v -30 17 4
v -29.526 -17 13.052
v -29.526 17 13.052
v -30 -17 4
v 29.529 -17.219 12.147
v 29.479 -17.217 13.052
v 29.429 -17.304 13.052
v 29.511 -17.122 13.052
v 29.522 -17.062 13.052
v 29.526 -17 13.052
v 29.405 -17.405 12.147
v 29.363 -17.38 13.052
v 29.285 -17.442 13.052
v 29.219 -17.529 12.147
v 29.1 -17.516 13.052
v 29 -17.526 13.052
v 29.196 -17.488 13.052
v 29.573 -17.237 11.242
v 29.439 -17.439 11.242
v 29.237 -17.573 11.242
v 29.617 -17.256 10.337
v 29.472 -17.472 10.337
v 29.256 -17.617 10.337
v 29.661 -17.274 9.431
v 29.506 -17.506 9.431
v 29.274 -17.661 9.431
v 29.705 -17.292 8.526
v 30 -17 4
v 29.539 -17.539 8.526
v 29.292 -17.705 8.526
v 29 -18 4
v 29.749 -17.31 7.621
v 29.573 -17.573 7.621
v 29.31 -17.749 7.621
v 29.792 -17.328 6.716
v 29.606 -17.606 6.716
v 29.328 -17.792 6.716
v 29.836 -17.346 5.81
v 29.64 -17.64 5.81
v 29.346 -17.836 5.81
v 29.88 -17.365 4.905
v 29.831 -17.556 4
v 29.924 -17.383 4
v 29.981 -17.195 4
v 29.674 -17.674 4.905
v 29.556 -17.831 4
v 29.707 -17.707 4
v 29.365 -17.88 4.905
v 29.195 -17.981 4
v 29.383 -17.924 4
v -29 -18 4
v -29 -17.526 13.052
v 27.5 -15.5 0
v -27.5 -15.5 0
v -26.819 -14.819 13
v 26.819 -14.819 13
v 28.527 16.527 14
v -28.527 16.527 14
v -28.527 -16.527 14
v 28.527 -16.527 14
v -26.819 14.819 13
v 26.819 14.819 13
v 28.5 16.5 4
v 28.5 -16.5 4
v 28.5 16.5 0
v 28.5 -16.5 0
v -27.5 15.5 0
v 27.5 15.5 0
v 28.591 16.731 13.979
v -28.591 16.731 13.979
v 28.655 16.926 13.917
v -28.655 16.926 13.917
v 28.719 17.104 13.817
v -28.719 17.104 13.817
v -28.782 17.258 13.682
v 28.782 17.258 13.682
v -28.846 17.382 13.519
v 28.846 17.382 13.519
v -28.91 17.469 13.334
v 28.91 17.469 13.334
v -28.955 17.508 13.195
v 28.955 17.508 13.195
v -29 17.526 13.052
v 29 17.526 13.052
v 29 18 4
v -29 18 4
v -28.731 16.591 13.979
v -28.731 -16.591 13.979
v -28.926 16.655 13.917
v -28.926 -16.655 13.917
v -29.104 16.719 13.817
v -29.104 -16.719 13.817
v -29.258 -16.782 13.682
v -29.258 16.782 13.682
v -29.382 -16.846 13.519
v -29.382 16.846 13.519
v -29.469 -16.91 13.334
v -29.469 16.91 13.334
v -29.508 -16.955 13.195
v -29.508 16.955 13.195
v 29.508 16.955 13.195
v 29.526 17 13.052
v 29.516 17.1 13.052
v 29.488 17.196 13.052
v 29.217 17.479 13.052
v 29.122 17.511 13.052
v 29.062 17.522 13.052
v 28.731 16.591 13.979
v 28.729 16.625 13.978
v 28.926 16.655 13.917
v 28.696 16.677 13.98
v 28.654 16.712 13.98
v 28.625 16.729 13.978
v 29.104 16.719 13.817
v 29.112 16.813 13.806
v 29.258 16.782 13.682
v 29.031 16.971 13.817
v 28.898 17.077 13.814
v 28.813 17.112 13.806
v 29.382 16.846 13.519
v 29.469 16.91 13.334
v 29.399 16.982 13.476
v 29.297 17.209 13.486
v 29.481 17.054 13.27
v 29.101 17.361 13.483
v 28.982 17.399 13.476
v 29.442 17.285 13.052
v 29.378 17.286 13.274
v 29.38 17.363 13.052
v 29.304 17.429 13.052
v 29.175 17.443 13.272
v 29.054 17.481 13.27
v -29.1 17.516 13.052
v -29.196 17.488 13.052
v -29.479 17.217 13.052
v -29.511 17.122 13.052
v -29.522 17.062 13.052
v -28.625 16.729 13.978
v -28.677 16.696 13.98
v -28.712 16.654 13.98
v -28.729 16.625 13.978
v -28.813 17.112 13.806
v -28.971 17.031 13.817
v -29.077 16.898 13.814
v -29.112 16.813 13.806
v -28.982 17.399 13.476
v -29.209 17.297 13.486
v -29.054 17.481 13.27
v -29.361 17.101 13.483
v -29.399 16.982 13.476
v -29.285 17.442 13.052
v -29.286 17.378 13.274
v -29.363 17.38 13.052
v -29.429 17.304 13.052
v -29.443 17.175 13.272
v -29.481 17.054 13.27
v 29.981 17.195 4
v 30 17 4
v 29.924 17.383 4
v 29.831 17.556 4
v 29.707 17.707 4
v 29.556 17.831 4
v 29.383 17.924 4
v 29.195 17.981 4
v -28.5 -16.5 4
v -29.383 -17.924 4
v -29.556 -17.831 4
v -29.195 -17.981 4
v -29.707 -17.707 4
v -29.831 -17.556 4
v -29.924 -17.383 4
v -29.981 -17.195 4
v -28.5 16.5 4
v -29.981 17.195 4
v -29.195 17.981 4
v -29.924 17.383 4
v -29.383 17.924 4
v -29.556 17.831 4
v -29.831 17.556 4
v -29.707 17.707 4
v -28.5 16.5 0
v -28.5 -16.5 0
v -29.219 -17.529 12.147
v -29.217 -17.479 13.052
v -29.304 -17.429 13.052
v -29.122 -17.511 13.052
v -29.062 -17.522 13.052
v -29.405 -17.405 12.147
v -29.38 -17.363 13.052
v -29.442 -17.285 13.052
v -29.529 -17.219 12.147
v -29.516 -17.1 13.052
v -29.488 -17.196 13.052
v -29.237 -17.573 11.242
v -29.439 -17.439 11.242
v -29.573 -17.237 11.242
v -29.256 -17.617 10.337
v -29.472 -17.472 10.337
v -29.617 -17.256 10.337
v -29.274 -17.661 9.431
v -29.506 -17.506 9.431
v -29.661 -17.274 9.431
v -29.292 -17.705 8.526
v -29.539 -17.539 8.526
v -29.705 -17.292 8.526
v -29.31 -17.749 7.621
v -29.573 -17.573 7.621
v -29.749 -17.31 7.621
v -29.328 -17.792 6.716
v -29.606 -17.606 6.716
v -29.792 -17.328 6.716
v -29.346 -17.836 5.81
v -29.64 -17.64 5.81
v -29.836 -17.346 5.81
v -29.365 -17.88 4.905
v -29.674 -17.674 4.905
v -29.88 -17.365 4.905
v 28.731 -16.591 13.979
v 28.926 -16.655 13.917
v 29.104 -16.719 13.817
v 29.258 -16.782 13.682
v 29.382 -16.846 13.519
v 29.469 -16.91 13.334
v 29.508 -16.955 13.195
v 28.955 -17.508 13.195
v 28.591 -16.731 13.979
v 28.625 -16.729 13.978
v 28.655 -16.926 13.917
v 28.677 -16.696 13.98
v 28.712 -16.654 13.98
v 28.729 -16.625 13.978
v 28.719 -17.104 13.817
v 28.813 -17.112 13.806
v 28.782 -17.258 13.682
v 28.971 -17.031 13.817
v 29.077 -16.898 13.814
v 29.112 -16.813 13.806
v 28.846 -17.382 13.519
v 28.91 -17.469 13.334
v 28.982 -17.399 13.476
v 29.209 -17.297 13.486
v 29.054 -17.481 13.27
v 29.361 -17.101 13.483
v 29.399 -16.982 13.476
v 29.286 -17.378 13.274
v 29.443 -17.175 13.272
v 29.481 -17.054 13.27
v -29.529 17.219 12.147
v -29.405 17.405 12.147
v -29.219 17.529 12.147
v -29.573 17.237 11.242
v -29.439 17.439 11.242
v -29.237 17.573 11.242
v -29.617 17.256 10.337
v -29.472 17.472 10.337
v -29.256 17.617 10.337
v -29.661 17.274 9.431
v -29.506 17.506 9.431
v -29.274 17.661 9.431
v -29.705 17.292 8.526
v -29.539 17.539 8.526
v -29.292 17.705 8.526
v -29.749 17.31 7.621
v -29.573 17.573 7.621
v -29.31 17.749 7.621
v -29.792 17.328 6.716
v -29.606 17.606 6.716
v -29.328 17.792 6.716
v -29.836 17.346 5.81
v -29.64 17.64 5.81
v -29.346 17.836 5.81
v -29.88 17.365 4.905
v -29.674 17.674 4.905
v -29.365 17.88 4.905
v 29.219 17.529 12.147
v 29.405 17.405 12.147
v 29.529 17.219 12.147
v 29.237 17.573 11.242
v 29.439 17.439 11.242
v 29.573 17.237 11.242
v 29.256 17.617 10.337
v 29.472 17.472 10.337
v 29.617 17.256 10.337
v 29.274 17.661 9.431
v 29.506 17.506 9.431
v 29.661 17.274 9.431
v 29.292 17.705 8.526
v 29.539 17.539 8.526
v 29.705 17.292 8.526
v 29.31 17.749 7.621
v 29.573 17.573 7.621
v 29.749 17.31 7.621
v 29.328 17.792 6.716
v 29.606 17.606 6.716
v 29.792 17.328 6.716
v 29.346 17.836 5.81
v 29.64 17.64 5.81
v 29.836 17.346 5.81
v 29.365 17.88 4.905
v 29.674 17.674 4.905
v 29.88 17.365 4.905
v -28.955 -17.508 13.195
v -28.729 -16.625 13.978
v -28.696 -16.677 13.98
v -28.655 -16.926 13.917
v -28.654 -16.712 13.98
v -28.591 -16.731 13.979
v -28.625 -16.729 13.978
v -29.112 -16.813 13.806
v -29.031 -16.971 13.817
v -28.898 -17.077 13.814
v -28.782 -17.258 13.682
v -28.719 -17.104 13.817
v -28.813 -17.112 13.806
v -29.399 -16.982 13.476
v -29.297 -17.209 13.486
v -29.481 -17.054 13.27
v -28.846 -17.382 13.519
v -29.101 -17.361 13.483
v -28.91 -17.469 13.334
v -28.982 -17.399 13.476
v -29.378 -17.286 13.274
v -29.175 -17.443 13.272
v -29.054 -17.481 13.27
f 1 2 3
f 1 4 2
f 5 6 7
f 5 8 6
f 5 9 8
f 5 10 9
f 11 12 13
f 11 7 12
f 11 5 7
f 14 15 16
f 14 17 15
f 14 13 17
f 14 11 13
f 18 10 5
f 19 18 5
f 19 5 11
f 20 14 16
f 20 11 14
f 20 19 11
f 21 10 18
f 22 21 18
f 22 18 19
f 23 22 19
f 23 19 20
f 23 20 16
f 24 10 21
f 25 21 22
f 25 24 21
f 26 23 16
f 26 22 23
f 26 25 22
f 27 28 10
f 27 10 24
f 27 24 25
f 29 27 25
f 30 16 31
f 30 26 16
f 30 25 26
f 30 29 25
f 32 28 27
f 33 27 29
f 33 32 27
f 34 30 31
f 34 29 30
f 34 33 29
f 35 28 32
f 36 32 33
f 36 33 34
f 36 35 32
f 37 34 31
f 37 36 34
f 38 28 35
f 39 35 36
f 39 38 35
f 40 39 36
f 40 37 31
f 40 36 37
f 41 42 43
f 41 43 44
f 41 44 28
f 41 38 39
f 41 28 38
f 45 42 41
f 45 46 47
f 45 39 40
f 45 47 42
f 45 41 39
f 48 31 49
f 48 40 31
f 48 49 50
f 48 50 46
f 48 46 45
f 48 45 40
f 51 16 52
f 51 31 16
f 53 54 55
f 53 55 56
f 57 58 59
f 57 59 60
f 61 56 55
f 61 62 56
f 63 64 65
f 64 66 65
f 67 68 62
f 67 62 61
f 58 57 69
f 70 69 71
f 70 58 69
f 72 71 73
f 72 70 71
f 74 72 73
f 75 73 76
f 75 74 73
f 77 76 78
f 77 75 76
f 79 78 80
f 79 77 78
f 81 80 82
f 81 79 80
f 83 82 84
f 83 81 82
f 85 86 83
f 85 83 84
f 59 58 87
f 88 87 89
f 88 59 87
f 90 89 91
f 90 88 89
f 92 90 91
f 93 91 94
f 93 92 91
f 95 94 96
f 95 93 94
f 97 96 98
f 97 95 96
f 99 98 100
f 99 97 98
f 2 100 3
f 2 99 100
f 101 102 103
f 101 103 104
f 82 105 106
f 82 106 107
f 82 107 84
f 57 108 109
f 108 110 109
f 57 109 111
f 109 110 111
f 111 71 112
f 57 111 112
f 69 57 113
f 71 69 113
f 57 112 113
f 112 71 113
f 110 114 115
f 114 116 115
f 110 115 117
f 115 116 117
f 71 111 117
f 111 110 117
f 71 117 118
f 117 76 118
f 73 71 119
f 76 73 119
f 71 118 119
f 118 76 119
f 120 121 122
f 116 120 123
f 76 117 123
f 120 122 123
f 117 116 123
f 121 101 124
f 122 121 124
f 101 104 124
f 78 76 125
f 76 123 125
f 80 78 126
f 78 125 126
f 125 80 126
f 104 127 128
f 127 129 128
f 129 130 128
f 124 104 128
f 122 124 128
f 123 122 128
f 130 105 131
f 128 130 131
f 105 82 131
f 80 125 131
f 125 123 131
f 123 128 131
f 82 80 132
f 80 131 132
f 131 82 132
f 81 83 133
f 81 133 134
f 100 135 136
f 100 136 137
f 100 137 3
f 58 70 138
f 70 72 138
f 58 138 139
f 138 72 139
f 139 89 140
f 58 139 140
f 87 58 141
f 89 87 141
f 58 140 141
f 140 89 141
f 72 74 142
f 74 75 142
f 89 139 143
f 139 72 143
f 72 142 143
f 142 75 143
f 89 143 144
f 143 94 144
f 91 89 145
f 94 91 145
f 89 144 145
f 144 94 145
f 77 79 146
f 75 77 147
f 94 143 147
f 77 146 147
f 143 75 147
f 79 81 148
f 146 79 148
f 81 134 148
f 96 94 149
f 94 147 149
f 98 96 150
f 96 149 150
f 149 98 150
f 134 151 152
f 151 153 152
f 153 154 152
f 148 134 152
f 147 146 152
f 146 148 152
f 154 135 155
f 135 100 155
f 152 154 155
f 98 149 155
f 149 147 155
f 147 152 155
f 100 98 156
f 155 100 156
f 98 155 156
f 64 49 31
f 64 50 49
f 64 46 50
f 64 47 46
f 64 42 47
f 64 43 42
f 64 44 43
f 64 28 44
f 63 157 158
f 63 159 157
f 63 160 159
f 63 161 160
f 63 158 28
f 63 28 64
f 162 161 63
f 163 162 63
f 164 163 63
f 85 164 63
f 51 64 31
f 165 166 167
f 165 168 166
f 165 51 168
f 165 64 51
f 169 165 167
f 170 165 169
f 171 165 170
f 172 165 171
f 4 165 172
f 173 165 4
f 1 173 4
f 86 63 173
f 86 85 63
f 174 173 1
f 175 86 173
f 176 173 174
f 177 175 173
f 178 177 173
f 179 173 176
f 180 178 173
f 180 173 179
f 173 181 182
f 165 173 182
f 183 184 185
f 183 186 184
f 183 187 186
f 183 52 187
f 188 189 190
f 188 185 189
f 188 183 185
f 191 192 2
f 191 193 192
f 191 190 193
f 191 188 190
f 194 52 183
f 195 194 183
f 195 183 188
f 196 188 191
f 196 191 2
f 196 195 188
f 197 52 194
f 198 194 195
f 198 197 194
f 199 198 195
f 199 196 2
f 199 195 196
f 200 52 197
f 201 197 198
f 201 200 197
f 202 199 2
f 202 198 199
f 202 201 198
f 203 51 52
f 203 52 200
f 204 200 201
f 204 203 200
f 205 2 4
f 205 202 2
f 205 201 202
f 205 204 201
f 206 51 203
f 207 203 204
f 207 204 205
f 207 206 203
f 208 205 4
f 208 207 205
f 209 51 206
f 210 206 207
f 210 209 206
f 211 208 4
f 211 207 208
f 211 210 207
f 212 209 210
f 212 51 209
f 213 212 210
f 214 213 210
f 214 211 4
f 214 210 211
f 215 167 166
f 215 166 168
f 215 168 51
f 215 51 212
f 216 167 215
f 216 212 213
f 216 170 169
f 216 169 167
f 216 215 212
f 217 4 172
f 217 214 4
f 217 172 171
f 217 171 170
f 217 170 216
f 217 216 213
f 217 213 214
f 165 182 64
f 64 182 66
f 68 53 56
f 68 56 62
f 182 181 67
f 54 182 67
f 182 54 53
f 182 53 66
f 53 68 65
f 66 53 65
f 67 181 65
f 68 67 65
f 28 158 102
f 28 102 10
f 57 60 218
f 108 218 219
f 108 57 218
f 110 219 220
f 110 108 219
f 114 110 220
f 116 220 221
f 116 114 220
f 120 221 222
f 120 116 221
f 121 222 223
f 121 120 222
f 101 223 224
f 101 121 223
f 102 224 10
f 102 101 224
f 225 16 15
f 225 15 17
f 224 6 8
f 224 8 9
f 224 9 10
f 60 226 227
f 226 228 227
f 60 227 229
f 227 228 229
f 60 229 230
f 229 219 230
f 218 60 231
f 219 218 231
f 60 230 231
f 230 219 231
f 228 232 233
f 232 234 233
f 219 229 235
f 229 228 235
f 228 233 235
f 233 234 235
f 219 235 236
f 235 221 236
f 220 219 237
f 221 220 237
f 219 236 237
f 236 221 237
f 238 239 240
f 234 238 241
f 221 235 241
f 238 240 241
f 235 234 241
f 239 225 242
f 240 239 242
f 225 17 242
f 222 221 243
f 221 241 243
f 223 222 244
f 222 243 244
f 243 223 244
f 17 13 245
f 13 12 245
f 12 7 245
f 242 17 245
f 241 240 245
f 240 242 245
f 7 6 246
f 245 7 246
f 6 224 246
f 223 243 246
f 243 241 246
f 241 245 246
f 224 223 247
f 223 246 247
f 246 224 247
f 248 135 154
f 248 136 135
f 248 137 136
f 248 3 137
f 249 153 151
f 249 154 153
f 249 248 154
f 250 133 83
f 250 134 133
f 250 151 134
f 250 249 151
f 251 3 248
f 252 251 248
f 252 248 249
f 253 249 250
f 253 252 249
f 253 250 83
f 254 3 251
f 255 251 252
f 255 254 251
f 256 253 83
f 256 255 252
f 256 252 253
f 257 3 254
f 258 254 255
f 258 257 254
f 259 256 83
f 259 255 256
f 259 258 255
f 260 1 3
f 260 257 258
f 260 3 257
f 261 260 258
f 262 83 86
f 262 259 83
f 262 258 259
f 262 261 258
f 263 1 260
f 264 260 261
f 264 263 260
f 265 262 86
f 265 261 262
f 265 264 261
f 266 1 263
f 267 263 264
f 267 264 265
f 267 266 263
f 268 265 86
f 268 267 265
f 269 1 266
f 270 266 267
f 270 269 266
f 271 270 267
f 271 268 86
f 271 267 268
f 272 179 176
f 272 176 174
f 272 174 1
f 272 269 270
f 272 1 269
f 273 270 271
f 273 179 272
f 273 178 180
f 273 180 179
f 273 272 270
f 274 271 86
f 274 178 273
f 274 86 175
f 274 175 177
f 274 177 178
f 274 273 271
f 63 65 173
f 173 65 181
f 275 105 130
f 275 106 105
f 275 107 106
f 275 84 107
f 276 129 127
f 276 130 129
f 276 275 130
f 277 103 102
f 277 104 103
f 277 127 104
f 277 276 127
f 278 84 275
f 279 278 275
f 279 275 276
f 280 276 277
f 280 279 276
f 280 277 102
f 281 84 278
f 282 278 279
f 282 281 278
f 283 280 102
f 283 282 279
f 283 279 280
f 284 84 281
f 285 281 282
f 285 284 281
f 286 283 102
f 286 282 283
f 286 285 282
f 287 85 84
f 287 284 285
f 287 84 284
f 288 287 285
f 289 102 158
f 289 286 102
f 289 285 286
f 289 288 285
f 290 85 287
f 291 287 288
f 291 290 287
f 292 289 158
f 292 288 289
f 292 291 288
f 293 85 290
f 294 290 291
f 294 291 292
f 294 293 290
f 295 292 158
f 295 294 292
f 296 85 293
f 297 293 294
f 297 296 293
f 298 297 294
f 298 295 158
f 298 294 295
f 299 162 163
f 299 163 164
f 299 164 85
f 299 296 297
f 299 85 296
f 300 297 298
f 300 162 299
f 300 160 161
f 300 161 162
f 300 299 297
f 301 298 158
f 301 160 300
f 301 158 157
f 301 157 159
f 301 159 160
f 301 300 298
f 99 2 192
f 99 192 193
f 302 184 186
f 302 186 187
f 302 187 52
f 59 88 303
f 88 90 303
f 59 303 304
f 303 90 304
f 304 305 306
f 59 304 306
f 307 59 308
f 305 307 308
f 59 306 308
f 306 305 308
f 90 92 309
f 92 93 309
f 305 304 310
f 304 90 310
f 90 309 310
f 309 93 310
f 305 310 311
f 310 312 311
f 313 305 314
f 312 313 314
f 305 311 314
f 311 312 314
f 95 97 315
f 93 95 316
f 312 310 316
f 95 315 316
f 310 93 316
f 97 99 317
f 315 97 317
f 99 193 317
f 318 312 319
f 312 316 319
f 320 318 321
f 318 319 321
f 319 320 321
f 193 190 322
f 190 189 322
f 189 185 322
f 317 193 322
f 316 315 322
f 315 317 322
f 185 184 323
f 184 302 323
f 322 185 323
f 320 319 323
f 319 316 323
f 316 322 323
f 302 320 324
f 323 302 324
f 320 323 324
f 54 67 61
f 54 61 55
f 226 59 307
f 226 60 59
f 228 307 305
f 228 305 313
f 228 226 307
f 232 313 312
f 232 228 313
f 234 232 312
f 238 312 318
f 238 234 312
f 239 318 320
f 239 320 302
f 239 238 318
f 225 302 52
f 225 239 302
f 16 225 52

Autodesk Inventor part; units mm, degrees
ref_plane "YZ Plane" through (0, 0, 0) normal (1, 0, 0) x (0, 1, 0)
ref_plane "XZ Plane" through (0, 0, 0) normal (0, 1, 0) x (-1, 0, 0)
ref_plane "XY Plane" through (0, 0, 0) normal (0, 0, 1) x (1, 0, 0)
sketch "Эскиз1" plane through (0, 0, 0) normal (0, 0, 1) x (1, 0, 0)
  line L0 (-29, 18) -> (29, 18)
  line L1 (30, 17) -> (30, -17)
  line L2 (29, -18) -> (-29, -18)
  line L3 (-30, -17) -> (-30, 17)
  arc A0 (-29, 18) -> (-30, 17) centre (-29, 17) ccw
  arc A1 (-30, -17) -> (-29, -18) centre (-29, -17) ccw
  arc A2 (29, -18) -> (30, -17) centre (29, -17) ccw
  arc A3 (30, 17) -> (29, 18) centre (29, 17) ccw
  point P0 (0, 0)
  point P1 (-30, 18)
  point P2 (30, 18)
  point P3 (-30, -18)
  dimension "d0" = 60
  dimension "d1" = 36
  dimension "d2" = 18
  dimension "d3" = 30
  dimension "d4" = 1
extrude "Выдавливание1" add sketch "Эскиз1" along normal blind 4
sketch "Эскиз3" plane through (0, 0, 4) normal (0, 0, 1) x (1, 0, 0)
  line L0 (-29, 18) -> (29, 18)
  line L1 (30, 17) -> (30, -17)
  line L2 (29, -18) -> (-29, -18)
  line L3 (-30, -17) -> (-30, 17)
  line L4 (30, -17) -> (30, 17) projected
  line L5 (-29, -18) -> (29, -18) projected
  line L6 (-30, 17) -> (-30, -17) projected
  line L7 (29, 18) -> (-29, 18) projected
  arc A0 (-29, 18) -> (-30, 17) centre (-29, 17) ccw
  arc A1 (-30, -17) -> (-29, -18) centre (-29, -17) ccw
  arc A2 (29, -18) -> (30, -17) centre (29, -17) ccw
  arc A3 (30, 17) -> (29, 18) centre (29, 17) ccw
  point P0 (0, 0)
  dimension "d7" = 0
  dimension "d8" = 0
  dimension "d9" = 0
  dimension "d10" = 0
  dimension "d11" = 1
extrude "Выдавливание2" add sketch "Эскиз3" along normal blind 10 draft -3
sketch "Эскиз4" plane through (0, 0, 0) normal (0, 0, -1) x (-1, 0, 0)
  line L0 (-27.5, 15.5) -> (27.5, 15.5)
  line L1 (27.5, 15.5) -> (27.5, -15.5)
  line L2 (27.5, -15.5) -> (-27.5, -15.5)
  line L3 (-27.5, -15.5) -> (-27.5, 15.5)
  point P0 (0, 0)
  dimension "d14" = 15.5
  dimension "d15" = 31
  dimension "d16" = 27.5
  dimension "d17" = 55
extrude "Выдавливание3" cut sketch "Эскиз4" against normal blind 13 draft -3
sketch "Эскиз5" plane through (0, 0, 0) normal (0, 0, -1) x (-1, 0, 0)
  line L0 (-28.5, 16.5) -> (28.5, 16.5)
  line L1 (28.5, 16.5) -> (28.5, -16.5)
  line L2 (28.5, -16.5) -> (-28.5, -16.5)
  line L3 (-28.5, -16.5) -> (-28.5, 16.5)
  line L4 (-29, 18) -> (29, 18) projected
  line L5 (-30, -17) -> (-30, 17) projected
  line L6 (29, -18) -> (-29, -18) projected
  line L7 (30, 17) -> (30, -17) projected
  line L8 (-29, 18) -> (29, 18)
  line L9 (30, 17) -> (30, -17)
  line L10 (29, -18) -> (-29, -18)
  line L11 (-30, -17) -> (-30, 17)
  arc A0 (-29, 18) -> (-30, 17) centre (-29, 17) ccw
  arc A1 (-30, -17) -> (-29, -18) centre (-29, -17) ccw
  arc A2 (29, -18) -> (30, -17) centre (29, -17) ccw
  arc A3 (30, 17) -> (29, 18) centre (29, 17) ccw
  point P0 (0, 0)
  point P1 (29, 18)
  dimension "d20" = 1.5
  dimension "d21" = 1.5
  dimension "d22" = 1.5
  dimension "d23" = 1.5
  dimension "d24" = 0
  dimension "d25" = 0
  dimension "d26" = 0
  dimension "d27" = 0
  dimension "d28" = 1
extrude "Выдавливание4" cut sketch "Эскиз5" against normal blind 4
fillet "Сопряжение1" radius 1 8 edges at (-29.3365, -17.3365, 14) (-29.4759, 0, 14) (-29.3365, 17.3365, 14) (0, 17.4759, 14) (29.3365, 17.3365, 14) (29.4759, 0, 14) (29.3365, -17.3365, 14) (0, -17.4759, 14)
properties part number "case_up" material "Пластик АБС"
